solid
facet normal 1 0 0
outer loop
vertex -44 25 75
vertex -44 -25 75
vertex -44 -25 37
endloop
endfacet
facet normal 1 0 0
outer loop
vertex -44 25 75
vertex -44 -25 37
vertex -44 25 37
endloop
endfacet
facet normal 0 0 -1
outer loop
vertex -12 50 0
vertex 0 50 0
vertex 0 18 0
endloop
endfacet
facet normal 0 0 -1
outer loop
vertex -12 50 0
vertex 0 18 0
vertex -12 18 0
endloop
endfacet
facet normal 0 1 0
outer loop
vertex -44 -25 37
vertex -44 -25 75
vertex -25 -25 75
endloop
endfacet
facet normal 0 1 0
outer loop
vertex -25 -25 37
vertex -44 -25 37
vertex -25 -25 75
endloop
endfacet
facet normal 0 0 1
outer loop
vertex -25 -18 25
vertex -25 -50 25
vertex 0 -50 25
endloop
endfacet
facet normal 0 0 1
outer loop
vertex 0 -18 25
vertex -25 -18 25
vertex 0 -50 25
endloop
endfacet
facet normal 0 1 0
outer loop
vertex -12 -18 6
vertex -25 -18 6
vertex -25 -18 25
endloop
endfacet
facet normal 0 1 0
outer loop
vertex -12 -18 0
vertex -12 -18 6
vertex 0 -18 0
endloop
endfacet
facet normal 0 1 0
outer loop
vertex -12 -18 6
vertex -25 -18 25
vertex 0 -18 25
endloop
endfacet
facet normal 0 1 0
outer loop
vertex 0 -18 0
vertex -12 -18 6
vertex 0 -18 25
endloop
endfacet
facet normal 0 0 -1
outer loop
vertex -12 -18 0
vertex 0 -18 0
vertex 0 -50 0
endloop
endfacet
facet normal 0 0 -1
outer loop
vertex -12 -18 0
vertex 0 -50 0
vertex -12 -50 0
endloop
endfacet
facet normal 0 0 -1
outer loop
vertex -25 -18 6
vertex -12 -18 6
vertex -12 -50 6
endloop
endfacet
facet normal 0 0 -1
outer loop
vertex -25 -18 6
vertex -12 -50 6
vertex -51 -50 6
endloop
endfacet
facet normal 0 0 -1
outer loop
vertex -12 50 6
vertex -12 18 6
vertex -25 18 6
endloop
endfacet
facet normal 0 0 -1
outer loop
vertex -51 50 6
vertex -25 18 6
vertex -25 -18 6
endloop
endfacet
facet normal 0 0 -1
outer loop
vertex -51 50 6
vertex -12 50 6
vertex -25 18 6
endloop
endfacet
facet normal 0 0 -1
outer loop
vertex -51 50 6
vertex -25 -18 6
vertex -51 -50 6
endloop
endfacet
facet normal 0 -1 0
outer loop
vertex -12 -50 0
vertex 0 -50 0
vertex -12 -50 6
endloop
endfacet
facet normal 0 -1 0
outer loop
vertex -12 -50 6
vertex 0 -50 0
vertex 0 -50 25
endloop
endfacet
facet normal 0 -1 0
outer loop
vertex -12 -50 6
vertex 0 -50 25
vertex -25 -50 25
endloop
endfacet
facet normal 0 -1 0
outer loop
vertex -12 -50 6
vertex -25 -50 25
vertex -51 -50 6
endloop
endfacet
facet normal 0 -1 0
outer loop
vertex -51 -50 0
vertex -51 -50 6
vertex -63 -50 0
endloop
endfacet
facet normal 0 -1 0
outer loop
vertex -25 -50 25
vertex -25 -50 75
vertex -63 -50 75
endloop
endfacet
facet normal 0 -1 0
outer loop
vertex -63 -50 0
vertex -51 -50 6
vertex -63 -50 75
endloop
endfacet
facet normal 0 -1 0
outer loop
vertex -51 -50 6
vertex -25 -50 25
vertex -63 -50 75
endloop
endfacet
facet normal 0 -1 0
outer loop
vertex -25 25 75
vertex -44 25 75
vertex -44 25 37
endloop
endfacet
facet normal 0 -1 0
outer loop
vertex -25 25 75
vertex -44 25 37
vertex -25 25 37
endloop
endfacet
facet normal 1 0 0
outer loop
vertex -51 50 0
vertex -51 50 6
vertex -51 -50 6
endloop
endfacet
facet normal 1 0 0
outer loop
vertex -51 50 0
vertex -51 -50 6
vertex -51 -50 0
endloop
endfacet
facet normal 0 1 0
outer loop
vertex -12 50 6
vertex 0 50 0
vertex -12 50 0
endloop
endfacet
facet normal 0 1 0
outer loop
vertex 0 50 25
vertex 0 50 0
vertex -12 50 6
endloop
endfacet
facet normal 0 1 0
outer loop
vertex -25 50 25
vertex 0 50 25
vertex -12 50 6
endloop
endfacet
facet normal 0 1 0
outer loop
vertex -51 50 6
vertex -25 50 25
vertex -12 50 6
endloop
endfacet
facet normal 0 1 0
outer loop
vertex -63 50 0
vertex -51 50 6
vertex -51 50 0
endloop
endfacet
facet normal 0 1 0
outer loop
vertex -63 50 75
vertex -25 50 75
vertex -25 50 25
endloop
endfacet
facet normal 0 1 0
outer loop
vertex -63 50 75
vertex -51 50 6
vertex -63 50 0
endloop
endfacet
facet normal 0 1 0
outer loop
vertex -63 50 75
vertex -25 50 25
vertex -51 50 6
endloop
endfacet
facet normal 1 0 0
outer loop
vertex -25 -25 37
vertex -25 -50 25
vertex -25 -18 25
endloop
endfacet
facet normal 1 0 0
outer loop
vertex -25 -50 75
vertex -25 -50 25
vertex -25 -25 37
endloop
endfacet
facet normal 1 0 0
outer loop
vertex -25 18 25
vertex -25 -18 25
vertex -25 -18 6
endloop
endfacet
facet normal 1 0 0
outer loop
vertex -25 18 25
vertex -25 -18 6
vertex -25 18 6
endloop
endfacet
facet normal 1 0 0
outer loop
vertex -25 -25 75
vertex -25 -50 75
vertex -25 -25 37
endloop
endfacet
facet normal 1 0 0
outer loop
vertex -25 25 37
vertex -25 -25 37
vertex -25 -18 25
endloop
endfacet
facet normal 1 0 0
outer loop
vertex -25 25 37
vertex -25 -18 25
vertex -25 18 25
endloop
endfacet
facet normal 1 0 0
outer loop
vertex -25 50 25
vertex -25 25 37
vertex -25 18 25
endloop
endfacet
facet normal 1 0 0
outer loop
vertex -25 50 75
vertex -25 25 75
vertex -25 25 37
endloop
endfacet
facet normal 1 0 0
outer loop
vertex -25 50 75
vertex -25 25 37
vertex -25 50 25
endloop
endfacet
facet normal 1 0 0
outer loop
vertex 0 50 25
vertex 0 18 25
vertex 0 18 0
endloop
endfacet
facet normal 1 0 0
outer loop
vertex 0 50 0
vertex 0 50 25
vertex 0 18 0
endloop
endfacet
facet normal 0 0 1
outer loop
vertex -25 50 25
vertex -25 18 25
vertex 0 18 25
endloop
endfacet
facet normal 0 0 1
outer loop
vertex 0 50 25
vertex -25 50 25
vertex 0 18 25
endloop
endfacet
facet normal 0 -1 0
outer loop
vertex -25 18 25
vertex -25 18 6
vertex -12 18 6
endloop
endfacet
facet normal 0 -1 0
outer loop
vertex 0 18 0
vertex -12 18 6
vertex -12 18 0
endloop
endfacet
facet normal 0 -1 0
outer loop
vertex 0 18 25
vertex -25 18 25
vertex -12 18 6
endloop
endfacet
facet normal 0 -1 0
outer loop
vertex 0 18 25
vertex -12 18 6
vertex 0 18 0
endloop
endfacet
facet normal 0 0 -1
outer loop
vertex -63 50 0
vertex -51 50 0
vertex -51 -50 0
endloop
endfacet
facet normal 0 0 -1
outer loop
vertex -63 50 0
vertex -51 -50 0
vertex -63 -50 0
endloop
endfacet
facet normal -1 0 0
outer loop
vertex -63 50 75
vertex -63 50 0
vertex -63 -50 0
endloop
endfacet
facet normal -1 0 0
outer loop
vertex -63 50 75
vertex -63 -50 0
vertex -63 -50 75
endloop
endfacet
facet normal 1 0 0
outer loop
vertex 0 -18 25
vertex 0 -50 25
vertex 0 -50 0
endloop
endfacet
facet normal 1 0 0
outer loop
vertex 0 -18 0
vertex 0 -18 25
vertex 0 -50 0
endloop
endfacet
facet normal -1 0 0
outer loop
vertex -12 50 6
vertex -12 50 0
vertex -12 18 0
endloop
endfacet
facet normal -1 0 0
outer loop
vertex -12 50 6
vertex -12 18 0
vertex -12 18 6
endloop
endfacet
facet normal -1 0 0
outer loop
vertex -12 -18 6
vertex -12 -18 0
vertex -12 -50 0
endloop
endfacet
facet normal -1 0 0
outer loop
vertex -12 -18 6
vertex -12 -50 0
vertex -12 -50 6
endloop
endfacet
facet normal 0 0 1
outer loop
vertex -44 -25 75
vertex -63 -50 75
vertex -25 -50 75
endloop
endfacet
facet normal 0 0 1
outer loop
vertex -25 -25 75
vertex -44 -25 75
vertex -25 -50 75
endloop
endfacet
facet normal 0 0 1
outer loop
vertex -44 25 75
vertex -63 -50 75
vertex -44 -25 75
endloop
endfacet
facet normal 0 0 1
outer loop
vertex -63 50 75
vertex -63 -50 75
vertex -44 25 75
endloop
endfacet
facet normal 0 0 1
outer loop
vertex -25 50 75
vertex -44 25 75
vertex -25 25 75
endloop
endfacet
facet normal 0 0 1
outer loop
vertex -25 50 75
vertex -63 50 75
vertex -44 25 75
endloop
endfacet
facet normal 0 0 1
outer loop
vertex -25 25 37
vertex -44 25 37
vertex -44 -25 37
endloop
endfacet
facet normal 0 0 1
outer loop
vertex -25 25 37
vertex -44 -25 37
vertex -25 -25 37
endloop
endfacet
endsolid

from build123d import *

# Parameters (mm, degrees)
BOSS_EXTRUDE1_DEPTH = 50
SKETCH2_W           = 19
SKETCH2_H           = 50
CUT_EXTRUDE1_DEPTH  = 38
SKETCH3_W           = 25
SKETCH3_H           = 36
CUT_EXTRUDE2_DEPTH  = 38


with BuildPart() as part:
    # Sketch1 → Boss-Extrude1 (new, symmetric)
    with BuildSketch(Plane(origin=(0, 0, 0), x_dir=(-1, 0, 0), z_dir=(0, 1, 0))):
        Polygon((0, 0), (12, 0), (12, 6), (51, 6), (51, 0), (63, 0), (63, 75), (25, 75), (25, 25), (0, 25), align=None)
    extrude(amount=BOSS_EXTRUDE1_DEPTH, both=True)

    # Sketch2 → Cut-Extrude1 (cut)
    with BuildSketch(Plane.XY.offset(75)):
        with Locations((-34.5, 0)):
            Rectangle(SKETCH2_W, SKETCH2_H)
    extrude(amount=-CUT_EXTRUDE1_DEPTH, mode=Mode.SUBTRACT)

    # Sketch3 → Cut-Extrude2 (cut)
    with BuildSketch(Plane.XY.offset(25)):
        with Locations((-12.5, 0)):
            Rectangle(SKETCH3_W, SKETCH3_H)
    extrude(amount=-CUT_EXTRUDE2_DEPTH, mode=Mode.SUBTRACT)


solid = part.part
